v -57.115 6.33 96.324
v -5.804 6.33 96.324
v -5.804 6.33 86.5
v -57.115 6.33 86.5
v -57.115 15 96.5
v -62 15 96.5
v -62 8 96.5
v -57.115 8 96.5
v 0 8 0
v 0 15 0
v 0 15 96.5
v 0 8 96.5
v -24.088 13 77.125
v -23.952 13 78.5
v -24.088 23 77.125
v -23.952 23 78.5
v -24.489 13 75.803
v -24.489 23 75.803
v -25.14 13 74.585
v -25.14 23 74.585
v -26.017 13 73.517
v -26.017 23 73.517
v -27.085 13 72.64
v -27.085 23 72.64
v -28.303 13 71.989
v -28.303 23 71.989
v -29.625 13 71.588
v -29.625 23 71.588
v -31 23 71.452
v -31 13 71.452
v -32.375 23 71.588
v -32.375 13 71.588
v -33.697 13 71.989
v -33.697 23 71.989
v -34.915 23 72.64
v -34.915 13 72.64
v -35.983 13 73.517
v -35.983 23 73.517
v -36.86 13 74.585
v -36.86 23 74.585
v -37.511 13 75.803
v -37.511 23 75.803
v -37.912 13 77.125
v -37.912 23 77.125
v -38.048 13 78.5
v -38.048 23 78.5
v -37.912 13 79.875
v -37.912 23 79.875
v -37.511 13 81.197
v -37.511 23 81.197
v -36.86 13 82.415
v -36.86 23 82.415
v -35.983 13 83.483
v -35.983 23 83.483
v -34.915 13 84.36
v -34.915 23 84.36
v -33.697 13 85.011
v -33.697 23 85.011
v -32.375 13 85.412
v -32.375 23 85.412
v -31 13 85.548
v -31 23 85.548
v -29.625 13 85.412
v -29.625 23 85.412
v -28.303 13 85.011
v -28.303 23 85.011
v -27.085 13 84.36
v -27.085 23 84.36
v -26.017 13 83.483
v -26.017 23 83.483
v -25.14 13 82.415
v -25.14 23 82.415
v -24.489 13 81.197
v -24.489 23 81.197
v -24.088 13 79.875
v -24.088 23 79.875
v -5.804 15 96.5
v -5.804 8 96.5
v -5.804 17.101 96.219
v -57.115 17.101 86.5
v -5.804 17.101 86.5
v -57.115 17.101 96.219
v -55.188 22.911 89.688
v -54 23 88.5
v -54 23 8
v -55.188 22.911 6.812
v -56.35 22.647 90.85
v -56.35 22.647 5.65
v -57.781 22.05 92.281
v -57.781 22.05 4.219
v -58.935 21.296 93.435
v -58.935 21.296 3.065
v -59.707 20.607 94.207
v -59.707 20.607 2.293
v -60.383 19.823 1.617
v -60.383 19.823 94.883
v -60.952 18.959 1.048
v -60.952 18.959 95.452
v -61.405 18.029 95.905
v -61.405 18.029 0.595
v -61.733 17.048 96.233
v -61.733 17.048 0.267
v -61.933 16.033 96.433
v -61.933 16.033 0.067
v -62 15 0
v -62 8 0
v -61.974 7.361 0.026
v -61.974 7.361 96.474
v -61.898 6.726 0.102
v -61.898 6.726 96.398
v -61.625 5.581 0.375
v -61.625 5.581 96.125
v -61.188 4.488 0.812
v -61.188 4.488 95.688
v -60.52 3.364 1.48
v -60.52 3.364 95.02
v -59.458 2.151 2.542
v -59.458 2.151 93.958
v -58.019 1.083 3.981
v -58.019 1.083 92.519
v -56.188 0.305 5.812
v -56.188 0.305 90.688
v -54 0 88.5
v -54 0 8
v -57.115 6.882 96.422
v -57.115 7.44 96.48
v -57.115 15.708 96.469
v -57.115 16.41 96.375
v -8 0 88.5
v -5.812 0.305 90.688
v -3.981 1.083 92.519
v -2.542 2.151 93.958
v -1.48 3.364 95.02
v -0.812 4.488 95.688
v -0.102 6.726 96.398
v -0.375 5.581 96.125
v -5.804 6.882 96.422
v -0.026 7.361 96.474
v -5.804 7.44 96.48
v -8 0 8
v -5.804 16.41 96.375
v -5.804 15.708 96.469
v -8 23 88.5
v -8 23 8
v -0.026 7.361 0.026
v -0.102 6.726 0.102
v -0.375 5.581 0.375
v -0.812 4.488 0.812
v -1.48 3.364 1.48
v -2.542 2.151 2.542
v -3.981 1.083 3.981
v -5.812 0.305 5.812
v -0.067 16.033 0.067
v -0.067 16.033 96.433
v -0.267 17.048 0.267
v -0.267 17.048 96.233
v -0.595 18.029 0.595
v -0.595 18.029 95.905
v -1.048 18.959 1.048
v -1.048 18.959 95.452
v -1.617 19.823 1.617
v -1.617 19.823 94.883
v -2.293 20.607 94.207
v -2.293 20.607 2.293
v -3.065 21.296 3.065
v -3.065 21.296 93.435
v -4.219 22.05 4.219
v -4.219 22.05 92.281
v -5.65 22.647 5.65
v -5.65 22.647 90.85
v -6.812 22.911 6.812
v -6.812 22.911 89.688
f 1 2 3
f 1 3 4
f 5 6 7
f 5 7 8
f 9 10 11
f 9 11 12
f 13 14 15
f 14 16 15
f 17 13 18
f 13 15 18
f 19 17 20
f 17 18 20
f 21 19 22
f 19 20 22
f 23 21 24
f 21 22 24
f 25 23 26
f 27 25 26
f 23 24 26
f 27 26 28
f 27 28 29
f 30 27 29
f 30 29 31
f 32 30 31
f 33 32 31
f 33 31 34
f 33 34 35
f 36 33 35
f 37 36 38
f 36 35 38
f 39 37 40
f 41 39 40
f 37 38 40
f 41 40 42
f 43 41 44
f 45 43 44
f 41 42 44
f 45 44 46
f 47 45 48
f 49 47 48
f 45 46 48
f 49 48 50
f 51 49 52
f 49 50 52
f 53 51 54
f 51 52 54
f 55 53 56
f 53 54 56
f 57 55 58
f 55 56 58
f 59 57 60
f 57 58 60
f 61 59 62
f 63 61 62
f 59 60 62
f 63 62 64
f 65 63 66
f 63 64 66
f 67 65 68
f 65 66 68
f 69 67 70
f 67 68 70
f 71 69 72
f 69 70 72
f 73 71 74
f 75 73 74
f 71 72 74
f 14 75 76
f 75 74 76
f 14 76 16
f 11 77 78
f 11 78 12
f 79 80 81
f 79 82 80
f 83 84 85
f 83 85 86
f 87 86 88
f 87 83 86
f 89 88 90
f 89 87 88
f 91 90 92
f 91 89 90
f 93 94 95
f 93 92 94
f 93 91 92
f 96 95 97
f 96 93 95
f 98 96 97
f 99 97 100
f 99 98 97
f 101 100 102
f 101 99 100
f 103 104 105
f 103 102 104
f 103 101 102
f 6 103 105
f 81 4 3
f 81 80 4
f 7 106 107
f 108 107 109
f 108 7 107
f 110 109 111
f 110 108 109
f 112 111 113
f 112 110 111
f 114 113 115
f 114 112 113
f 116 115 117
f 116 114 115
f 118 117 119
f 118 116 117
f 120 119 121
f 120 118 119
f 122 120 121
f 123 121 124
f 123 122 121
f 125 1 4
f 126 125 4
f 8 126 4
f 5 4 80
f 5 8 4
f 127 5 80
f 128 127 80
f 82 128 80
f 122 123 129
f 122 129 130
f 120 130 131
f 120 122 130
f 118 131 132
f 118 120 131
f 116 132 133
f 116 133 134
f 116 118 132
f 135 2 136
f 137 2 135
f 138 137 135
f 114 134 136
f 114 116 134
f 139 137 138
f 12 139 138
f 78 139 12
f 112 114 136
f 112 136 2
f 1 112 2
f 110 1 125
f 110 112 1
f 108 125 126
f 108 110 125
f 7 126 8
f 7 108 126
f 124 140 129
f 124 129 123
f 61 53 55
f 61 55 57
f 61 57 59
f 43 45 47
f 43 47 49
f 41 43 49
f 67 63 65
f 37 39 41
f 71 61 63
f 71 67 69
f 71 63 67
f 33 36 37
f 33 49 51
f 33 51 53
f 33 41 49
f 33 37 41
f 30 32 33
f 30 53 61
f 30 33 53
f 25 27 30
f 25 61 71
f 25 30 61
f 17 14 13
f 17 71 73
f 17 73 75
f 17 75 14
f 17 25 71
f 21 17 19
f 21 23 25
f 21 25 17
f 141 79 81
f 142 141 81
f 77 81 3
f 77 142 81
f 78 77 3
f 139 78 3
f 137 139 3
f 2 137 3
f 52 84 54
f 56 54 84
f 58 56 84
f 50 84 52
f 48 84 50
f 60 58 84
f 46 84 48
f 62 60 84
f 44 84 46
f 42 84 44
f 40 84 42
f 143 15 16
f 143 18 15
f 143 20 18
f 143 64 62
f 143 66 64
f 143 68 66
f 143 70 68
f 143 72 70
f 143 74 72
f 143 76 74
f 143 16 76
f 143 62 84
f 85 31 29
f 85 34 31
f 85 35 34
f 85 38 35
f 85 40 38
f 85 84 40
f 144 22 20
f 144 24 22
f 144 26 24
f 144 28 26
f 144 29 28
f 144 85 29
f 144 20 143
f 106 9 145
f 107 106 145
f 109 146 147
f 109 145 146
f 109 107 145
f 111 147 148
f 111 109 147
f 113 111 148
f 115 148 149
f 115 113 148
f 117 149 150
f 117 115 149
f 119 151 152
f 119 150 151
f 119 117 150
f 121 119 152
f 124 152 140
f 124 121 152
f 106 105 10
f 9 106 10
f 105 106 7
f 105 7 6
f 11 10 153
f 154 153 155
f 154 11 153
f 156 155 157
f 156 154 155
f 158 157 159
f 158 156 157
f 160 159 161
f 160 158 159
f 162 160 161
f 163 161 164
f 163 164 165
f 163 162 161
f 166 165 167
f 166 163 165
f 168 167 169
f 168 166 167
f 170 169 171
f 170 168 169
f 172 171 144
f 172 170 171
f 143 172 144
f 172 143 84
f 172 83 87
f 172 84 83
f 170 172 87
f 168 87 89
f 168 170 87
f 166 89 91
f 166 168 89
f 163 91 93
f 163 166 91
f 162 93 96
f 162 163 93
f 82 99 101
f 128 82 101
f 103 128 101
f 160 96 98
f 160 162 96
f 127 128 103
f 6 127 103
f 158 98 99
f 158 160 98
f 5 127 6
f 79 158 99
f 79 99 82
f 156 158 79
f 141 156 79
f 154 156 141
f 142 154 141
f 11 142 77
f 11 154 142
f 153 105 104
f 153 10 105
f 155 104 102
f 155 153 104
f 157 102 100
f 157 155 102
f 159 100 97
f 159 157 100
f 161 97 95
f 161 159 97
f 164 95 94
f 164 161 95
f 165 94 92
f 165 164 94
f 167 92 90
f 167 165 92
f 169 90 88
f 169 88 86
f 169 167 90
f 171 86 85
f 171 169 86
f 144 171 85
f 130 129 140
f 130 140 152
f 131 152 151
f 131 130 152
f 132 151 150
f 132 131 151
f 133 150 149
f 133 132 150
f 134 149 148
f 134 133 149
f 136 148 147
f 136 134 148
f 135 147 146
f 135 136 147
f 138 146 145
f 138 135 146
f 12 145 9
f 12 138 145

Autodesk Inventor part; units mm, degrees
ref_plane "YZ Plane" through (0, 0, 0) normal (1, 0, 0) x (0, 1, 0)
ref_plane "XZ Plane" through (0, 0, 0) normal (0, 1, 0) x (-1, 0, 0)
ref_plane "XY Plane" through (0, 0, 0) normal (0, 0, 1) x (1, 0, 0)
sketch "Skizze1" plane through (0, 0, 0) normal (0, 0, 1) x (1, 0, 0)
  line L0 (0, 0) -> (-62, 0)
  line L1 (-62, 0) -> (-62, 23)
  line L2 (-62, 23) -> (0, 23)
  line L3 (0, 23) -> (0, 0)
  dimension "d0" = 62
  dimension "d1" = 23
extrude "Extrusion1" add sketch "Skizze1" along normal blind 96.5
sketch "Skizze2" plane through (-62, 23, 0) normal (0, 1, 0) x (1, 0, 0)
  circle A0 centre (31, -78.5) radius 7.0477
  line L0 (62, -96.5) -> (0, -96.5) projected
  line L1 (0, 0) -> (0, -96.5) projected
  point P0 (62, 0)
  dimension "d4" = 18
  dimension "d5" = 31
extrude "Extrusion2" cut sketch "Skizze2" against normal blind 10
fillet "Rundung1" radius 8 8 edges at (0, 23, 48.25) (0, 0, 48.25) (-62, 23, 48.25) (-62, 0, 48.25) (-31, 0, 96.5) (-31, 23, 96.5) (-31, 23, 0) (-31, 0, 0)
sketch "Skizze3" plane through (0, 0, 96.5) normal (0, 0, 1) x (1, 0, 0)
  line L0 (0, 8) -> (-62, 8) projected
  line L1 (0, 8) -> (0, 15) projected
  line L2 (-62, 15) -> (0, 15) projected
  line L3 (-62, 15) -> (-62, 8) projected
  line L4 (-57.1154, 17.1012) -> (-5.8036, 17.1012)
  line L5 (-5.8036, 17.1012) -> (-5.8036, 6.3302)
  line L6 (-5.8036, 6.3302) -> (-57.1154, 6.3302)
  line L7 (-57.1154, 6.3302) -> (-57.1154, 17.1012)
  point P0 (0, 0)
extrude "Extrusion3" cut sketch "Skizze3" against normal blind 10 contours L5 L6 L7 L0 | L0 L7 L2 L5 | L2 L7 L4 L5
properties part number "Anker"
